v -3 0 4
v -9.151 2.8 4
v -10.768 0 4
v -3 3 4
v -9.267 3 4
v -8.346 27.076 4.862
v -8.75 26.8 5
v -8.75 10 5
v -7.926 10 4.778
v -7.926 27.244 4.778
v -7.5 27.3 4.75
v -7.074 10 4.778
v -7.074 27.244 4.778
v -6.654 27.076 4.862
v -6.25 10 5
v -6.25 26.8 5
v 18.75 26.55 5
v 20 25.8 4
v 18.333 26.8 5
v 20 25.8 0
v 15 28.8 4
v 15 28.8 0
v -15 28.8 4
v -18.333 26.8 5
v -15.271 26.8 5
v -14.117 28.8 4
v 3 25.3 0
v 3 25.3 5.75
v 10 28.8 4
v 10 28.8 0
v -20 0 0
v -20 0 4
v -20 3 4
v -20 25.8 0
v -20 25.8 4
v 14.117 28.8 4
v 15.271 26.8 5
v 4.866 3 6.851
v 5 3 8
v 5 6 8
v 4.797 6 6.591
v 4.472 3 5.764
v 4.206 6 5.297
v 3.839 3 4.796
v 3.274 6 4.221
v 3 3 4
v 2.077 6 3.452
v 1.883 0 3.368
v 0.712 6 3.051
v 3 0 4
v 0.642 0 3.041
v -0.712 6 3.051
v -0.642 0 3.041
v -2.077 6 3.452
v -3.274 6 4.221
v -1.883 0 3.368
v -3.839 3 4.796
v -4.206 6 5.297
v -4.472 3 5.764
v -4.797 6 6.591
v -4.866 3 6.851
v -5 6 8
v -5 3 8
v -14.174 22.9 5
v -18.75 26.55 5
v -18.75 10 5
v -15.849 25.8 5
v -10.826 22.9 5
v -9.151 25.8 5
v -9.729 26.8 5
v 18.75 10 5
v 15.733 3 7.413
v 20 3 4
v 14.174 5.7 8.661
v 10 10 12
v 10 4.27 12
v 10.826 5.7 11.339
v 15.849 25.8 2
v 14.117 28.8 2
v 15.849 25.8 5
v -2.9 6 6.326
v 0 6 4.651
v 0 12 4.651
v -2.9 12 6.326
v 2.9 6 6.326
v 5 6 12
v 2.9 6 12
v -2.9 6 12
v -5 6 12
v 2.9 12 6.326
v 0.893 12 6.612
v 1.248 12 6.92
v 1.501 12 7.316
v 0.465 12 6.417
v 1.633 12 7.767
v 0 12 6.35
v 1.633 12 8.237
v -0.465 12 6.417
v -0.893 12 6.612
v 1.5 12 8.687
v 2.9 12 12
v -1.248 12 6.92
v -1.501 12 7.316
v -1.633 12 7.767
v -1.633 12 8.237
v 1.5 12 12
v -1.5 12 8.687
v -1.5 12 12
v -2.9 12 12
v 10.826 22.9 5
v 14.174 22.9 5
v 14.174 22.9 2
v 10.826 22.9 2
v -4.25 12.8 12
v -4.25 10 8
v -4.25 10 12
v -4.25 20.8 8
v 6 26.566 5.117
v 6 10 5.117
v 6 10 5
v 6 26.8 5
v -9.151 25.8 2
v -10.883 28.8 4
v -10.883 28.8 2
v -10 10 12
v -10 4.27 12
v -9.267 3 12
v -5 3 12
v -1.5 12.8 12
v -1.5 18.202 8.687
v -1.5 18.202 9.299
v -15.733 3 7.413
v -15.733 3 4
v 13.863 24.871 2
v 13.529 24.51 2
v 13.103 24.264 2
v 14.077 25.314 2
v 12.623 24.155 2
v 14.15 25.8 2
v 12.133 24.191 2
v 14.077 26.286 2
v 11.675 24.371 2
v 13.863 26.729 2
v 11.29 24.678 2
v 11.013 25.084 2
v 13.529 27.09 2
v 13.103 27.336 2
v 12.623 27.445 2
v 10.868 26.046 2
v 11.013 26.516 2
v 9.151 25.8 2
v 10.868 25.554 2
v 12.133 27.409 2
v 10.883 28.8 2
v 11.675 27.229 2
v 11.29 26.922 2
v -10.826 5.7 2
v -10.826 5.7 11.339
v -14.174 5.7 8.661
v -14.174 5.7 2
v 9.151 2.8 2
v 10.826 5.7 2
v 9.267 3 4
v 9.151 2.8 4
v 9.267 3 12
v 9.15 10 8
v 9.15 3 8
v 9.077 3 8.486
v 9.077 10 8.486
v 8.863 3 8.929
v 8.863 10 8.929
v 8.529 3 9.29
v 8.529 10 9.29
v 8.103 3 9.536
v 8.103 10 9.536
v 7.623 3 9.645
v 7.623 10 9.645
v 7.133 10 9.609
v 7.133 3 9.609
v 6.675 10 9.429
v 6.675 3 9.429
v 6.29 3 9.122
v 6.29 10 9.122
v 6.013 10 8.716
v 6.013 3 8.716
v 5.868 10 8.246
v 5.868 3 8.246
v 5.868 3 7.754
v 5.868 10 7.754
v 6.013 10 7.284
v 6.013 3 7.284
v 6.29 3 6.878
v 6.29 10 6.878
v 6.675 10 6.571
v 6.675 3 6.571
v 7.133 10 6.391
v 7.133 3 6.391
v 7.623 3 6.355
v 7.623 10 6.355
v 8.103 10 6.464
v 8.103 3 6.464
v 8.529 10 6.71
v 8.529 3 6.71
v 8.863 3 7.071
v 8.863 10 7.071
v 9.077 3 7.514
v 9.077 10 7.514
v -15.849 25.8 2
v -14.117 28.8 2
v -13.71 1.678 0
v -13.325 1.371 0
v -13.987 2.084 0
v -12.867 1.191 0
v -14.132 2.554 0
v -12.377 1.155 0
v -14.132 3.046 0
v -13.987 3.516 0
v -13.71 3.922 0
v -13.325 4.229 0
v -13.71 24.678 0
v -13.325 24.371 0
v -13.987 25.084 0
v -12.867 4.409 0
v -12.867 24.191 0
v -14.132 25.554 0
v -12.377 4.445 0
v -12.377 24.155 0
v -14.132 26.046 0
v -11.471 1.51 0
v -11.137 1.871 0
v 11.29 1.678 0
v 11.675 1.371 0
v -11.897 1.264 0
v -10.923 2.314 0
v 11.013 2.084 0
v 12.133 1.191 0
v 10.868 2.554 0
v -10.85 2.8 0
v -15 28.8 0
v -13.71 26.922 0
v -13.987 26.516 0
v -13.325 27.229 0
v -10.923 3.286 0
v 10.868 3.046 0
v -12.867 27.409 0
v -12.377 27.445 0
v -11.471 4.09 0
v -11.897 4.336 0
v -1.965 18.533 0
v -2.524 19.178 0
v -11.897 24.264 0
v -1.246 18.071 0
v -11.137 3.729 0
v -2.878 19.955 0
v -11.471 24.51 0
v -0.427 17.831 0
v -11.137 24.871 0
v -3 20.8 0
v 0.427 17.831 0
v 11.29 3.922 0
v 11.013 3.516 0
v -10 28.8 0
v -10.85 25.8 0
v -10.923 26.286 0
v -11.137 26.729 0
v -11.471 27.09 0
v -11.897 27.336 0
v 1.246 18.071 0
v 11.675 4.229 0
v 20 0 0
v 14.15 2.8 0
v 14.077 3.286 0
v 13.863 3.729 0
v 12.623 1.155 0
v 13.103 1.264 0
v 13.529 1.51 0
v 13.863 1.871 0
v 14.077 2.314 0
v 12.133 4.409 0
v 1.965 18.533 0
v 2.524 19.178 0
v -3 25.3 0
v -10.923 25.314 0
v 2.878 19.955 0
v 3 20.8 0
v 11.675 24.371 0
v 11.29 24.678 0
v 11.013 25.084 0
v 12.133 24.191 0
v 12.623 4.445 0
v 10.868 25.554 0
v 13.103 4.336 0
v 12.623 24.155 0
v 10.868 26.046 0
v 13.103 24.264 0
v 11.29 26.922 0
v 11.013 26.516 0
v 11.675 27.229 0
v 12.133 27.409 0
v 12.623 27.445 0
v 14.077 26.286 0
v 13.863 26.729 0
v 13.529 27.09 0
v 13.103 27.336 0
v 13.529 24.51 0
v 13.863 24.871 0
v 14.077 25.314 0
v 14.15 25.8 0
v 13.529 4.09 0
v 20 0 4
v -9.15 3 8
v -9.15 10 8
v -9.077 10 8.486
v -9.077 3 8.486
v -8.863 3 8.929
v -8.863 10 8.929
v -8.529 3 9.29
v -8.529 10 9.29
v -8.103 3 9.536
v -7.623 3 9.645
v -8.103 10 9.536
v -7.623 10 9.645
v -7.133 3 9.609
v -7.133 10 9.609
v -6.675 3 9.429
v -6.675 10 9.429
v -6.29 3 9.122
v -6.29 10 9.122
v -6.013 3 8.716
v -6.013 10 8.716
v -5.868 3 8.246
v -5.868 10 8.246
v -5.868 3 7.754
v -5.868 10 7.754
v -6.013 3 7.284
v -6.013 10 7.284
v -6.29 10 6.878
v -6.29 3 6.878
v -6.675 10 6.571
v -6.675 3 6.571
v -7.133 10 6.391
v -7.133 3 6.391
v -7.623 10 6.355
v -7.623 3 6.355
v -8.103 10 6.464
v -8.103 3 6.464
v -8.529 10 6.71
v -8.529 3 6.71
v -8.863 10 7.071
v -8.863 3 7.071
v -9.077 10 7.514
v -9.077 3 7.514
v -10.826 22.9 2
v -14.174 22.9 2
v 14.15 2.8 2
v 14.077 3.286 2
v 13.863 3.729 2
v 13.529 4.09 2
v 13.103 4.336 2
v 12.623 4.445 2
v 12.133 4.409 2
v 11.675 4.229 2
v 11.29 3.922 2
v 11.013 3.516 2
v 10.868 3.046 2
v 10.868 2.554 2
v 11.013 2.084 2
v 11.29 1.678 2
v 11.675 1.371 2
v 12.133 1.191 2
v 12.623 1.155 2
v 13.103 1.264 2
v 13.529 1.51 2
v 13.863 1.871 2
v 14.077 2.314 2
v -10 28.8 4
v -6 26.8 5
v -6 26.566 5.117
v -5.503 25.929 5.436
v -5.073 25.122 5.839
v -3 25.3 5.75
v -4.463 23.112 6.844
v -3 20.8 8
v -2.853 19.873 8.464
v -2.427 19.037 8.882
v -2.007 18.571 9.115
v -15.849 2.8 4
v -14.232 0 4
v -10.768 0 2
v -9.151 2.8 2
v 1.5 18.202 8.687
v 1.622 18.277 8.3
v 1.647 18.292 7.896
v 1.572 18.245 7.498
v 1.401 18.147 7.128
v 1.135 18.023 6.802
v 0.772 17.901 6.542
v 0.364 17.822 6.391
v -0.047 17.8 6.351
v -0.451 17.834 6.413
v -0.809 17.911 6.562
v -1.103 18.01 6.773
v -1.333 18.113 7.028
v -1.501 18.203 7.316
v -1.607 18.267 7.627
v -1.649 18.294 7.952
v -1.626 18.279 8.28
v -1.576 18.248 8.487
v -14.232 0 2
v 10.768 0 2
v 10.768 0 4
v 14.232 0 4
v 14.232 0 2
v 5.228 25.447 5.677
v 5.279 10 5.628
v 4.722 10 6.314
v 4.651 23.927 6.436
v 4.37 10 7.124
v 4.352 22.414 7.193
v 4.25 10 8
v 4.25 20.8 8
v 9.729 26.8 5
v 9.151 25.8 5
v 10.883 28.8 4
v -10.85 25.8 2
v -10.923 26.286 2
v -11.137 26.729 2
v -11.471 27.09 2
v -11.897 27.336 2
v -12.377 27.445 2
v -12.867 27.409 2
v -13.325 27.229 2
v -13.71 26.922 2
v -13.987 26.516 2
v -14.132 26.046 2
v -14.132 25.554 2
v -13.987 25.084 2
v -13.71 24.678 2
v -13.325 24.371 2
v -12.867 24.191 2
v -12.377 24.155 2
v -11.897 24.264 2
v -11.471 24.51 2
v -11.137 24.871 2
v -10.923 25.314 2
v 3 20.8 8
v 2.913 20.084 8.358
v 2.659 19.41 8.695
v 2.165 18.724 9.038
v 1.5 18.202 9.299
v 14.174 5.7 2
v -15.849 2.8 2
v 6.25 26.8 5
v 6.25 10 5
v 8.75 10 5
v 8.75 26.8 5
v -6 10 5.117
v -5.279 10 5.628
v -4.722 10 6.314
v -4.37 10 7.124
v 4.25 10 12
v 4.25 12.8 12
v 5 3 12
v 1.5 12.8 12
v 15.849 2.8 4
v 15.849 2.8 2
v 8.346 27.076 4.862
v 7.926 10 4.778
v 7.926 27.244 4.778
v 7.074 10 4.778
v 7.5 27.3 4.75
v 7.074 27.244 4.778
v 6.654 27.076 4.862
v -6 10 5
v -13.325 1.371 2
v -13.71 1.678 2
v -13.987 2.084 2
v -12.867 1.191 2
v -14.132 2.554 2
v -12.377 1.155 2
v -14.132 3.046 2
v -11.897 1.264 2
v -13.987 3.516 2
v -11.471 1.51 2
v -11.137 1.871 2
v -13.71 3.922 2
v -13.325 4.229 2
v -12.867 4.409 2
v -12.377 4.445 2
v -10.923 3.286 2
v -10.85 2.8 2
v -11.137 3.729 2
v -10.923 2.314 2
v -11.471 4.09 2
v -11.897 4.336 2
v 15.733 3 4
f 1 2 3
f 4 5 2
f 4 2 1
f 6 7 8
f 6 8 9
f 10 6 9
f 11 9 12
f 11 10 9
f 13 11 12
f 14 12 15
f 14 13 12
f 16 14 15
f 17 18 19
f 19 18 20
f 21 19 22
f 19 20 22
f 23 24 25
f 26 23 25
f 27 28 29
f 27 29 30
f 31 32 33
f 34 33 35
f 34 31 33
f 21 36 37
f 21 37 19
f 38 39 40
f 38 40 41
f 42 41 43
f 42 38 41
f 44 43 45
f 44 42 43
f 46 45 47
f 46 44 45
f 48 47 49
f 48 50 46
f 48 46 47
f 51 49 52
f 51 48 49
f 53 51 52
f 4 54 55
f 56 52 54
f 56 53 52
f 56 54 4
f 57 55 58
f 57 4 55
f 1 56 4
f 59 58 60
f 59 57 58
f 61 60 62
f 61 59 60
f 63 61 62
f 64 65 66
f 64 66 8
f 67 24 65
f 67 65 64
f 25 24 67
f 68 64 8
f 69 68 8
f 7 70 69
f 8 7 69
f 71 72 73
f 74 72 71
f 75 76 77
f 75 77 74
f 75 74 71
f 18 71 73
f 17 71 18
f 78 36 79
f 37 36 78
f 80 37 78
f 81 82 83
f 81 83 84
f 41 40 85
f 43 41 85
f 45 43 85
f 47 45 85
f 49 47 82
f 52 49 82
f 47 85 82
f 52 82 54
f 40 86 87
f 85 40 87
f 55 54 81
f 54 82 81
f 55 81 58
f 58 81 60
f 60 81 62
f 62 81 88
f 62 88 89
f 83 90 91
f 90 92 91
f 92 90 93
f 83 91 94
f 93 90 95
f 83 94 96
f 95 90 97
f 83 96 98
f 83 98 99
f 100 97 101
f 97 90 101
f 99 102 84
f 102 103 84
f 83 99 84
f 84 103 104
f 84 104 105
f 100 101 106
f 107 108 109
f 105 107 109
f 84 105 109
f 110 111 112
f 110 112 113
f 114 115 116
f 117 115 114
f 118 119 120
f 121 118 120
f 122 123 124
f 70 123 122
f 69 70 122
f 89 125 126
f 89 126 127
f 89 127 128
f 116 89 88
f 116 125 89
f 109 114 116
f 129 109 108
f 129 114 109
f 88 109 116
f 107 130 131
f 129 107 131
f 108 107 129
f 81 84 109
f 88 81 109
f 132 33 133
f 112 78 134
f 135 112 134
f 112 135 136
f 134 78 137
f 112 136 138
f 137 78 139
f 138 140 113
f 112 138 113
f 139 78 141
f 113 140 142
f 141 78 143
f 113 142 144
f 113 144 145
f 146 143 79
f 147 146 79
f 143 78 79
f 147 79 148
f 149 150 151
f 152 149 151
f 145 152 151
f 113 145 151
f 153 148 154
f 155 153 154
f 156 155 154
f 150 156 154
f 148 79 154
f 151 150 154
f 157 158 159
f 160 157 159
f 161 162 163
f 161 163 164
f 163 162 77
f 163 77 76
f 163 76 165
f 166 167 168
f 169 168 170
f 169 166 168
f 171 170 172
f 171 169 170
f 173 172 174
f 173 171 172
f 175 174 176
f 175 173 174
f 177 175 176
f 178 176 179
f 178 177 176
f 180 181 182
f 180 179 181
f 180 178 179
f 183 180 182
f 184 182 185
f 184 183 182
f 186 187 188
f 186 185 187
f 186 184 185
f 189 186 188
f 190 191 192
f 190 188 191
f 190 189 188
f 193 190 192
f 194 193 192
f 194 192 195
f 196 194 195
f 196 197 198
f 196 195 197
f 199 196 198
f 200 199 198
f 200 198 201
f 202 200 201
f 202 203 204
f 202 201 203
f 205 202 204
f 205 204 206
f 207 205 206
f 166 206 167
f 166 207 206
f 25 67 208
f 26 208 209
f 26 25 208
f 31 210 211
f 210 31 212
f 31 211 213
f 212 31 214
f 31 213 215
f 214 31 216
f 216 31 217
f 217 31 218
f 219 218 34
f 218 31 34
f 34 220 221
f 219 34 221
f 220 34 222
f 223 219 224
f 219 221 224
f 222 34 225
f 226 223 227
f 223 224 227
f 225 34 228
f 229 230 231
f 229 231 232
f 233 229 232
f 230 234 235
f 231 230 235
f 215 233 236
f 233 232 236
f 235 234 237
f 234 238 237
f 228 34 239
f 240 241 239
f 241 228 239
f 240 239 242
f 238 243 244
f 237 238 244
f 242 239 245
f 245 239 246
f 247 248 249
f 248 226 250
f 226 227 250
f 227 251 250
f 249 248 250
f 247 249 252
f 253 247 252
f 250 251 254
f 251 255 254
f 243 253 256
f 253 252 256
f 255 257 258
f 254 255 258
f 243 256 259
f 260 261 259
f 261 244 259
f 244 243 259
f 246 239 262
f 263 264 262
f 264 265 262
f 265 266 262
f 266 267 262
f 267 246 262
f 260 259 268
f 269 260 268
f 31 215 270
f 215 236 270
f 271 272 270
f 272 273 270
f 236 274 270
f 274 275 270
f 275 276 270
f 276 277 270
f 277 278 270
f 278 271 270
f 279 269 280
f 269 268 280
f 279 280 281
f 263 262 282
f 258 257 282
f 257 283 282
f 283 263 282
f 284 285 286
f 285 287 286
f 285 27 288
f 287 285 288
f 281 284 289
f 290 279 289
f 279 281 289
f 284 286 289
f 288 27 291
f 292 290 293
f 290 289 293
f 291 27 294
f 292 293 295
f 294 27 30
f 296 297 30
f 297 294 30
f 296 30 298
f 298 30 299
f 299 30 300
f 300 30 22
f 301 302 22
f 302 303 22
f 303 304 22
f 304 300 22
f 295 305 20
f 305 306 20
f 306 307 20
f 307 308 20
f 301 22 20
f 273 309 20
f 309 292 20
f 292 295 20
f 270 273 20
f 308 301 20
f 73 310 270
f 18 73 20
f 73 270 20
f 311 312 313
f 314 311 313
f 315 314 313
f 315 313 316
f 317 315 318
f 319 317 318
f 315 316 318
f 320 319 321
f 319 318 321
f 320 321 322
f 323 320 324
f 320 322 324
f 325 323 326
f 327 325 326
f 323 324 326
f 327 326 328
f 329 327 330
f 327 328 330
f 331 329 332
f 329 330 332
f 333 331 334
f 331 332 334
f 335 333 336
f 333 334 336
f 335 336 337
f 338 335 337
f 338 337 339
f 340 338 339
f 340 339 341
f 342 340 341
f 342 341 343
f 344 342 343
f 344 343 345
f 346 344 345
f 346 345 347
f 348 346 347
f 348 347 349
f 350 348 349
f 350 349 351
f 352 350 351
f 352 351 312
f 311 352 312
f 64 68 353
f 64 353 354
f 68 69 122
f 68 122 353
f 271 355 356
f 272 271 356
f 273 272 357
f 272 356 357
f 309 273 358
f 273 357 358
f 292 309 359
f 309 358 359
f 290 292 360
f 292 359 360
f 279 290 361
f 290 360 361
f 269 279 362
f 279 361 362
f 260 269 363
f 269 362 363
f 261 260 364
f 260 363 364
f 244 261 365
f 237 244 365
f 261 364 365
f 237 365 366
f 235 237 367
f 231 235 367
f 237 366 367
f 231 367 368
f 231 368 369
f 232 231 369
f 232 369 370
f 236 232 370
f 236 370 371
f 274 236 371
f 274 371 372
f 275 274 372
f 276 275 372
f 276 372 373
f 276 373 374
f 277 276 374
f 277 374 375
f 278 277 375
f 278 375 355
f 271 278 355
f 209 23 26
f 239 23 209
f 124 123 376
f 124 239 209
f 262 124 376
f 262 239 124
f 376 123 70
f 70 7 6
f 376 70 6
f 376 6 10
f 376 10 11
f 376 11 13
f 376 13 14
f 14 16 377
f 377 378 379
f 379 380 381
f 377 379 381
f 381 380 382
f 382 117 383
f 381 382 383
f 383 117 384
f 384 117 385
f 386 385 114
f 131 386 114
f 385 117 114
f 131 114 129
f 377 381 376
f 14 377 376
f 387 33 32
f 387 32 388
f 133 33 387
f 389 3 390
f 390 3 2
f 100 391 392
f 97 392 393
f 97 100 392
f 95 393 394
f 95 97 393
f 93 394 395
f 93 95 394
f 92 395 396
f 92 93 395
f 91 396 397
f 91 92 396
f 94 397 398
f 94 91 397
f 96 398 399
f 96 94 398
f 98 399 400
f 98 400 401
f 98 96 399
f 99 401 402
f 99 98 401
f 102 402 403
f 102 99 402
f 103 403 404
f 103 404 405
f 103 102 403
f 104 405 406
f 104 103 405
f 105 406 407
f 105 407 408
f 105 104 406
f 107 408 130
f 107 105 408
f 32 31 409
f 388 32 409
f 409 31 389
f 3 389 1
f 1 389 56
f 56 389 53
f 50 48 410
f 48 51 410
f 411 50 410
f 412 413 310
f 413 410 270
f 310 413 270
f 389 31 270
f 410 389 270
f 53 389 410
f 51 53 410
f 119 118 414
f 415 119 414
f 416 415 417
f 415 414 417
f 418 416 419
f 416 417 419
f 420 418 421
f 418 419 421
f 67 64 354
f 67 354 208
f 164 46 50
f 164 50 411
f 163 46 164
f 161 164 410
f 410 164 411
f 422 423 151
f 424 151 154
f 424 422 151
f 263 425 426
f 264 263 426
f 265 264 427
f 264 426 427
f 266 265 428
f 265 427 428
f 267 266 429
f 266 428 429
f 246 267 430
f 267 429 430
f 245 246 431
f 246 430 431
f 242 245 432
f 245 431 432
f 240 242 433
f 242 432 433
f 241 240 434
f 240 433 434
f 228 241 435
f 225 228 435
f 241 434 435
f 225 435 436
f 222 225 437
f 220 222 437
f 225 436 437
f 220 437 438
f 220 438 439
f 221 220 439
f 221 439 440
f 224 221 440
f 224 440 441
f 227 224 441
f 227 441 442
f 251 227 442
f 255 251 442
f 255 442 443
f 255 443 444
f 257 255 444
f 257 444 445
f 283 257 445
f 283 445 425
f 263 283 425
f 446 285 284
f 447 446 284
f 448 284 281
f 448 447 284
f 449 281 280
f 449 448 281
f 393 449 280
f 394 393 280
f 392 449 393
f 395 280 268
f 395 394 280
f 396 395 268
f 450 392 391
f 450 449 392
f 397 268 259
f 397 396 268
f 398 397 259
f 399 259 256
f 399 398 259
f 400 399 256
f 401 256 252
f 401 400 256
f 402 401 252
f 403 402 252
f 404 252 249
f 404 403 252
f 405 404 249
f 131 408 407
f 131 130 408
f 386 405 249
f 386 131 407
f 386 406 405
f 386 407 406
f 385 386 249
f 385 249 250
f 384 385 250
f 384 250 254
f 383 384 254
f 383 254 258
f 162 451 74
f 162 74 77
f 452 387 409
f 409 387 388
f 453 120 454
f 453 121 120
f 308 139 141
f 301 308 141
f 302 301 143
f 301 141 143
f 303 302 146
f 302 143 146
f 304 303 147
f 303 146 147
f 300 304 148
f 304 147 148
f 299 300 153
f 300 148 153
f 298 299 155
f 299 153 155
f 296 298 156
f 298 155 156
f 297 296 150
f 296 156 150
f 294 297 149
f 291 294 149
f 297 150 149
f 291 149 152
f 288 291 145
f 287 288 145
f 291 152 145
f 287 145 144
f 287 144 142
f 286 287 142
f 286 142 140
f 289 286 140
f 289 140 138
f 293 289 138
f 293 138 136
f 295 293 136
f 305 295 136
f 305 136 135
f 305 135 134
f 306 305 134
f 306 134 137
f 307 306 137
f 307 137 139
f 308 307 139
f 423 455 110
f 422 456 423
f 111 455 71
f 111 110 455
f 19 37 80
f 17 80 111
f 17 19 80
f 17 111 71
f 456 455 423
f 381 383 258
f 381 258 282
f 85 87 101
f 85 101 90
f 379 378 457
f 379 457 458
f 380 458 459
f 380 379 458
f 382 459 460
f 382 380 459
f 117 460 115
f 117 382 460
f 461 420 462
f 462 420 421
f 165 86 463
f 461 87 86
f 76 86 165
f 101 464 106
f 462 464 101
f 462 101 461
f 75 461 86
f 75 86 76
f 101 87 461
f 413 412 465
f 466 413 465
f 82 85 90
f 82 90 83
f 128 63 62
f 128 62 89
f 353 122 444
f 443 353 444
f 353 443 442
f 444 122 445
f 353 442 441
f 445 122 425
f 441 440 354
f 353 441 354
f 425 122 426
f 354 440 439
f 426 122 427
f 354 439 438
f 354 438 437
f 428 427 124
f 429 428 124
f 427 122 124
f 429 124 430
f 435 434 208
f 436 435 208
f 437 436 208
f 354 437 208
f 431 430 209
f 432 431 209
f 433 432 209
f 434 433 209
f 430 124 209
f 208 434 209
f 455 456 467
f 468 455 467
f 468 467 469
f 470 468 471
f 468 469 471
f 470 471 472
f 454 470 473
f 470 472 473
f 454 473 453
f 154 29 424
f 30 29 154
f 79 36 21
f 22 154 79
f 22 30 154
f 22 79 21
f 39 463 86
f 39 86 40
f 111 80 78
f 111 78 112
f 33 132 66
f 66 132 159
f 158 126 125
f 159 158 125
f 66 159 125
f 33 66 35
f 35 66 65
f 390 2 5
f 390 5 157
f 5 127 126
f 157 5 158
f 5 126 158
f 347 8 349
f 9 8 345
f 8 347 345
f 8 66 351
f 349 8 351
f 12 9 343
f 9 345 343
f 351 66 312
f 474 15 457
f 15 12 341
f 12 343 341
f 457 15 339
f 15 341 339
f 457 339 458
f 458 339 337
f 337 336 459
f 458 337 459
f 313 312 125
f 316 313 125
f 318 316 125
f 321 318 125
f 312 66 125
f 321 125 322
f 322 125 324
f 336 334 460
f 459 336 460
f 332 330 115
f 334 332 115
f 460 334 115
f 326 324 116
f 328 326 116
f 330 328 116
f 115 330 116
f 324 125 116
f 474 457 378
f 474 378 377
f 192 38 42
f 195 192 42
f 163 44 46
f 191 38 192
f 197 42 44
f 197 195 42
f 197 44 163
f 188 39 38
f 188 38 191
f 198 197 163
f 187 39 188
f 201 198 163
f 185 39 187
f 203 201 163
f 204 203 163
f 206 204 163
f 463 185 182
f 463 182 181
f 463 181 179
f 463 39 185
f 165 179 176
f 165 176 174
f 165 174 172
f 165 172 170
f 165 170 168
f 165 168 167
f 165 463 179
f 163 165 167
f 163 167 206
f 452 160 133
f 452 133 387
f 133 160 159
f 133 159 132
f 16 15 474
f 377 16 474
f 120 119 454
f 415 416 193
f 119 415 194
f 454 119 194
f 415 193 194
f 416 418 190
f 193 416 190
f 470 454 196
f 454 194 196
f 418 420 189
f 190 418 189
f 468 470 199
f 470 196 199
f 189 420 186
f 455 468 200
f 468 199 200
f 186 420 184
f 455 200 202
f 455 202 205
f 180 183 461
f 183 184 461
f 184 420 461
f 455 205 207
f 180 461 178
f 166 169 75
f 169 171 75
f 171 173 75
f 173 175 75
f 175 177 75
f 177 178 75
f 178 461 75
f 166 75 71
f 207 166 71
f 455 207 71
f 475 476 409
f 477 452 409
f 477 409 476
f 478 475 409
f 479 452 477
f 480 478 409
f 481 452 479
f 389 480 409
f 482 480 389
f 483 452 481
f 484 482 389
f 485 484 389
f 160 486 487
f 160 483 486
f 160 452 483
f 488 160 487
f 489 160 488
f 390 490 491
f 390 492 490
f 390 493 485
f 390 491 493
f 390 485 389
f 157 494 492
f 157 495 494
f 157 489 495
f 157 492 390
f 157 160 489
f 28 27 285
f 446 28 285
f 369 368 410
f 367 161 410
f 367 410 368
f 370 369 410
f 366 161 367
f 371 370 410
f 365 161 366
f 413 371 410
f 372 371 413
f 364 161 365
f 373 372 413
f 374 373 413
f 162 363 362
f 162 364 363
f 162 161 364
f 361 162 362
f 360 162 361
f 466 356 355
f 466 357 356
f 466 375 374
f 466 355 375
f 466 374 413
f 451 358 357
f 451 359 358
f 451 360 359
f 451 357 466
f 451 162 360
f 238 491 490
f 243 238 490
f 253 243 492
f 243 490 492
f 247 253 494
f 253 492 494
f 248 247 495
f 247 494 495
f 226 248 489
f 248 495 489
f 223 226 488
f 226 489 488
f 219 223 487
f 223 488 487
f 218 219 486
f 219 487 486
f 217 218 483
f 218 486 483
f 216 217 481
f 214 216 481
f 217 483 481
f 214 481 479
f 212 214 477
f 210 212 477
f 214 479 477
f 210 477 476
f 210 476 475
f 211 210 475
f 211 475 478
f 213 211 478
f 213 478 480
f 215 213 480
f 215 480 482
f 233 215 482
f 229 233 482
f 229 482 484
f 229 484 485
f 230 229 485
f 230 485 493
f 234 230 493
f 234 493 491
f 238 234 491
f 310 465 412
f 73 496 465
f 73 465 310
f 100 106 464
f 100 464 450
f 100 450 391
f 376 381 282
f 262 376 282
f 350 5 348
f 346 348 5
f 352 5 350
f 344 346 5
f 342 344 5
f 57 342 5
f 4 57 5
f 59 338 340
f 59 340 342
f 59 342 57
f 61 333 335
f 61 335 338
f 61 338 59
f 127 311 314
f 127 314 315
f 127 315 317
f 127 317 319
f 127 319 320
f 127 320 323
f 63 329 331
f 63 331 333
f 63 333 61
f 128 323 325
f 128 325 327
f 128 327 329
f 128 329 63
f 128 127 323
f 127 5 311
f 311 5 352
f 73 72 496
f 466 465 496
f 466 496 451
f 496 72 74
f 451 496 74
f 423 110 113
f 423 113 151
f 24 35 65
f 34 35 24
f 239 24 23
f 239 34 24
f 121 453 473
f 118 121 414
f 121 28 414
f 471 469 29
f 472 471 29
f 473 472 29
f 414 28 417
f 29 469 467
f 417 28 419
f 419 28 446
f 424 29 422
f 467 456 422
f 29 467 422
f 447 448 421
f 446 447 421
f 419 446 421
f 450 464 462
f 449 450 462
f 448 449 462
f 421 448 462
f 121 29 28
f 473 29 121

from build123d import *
from OCP.BRepFilletAPI import BRepFilletAPI_MakeChamfer

# Parameters (mm, degrees)
SKETCH1_W           = 40
SKETCH1_H           = 28.8
BOSS_EXTRUDE1_DEPTH = 12
CHAMFER2_SIZE       = 8
CHAMFER2_SIZE2      = 16
SKETCH10_W          = 14
SKETCH10_H          = 18.8
CUT_EXTRUDE7_DEPTH  = 7
SKETCH11_W          = 40
SKETCH11_H          = 3
CUT_EXTRUDE8_DEPTH  = 8
CHAMFER3_SIZE       = 8
CHAMFER3_SIZE2      = 10
CUT_EXTRUDE9_REACH  = 39.06
SKETCH13_R          = 1.65
CUT_EXTRUDE10_DEPTH = 30.957302949
CUT_EXTRUDE2_DEPTH  = 6
CUT_EXTRUDE3_DEPTH  = 38.05995143
SKETCH2_R           = 1.65
CUT_EXTRUDE1_DEPTH  = 38.05995143
CUT_EXTRUDE4_DEPTH  = 10
CUT_EXTRUDE5_DEPTH  = 6
CUT_EXTRUDE6_DEPTH  = 29.744390757
CHAMFER4_SIZE       = 3
CHAMFER4_SIZE_2     = 5
CHAMFER5_SIZE       = 3
CHAMFER5_SIZE_2     = 5
CHAMFER6_SIZE2      = 7
CHAMFER6_SIZE       = 3.5
CHAMFER7_SIZE2      = 7
CHAMFER7_SIZE       = 3.5


# Some blends are built 0.0001 mm under size
with BuildPart() as part:
    # Sketch1 → Boss-Extrude1 (new body)
    with BuildSketch(Plane.XY):
        with Locations((0, 14.4)):
            Rectangle(SKETCH1_W, SKETCH1_H)
    extrude(amount=BOSS_EXTRUDE1_DEPTH)

    # Chamfer2
    chamfer2_edges = [part.edges().sort_by_distance(p)[0] for p in [
        (0, 28.8, 12),
    ]]
    chamfer2_side = [part.faces().sort_by_distance(p)[0] for p in [
        (0, 28.8, 6),
    ]]
    chamfer(chamfer2_edges, length=CHAMFER2_SIZE, length2=CHAMFER2_SIZE2, reference=chamfer2_side[0])

    # Sketch10 → Cut-Extrude7 (cut)
    with BuildSketch(Plane.XY.offset(12)):
        with Locations((-13, 19.4)):
            Rectangle(SKETCH10_W, SKETCH10_H)
        with Locations((13, 19.4)):
            Rectangle(SKETCH10_W, SKETCH10_H)
    extrude(amount=-CUT_EXTRUDE7_DEPTH, mode=Mode.SUBTRACT)

    # Sketch11 → Cut-Extrude8 (cut)
    with BuildSketch(Plane.XY.offset(12)):
        with Locations((0, 1.5)):
            Rectangle(SKETCH11_W, SKETCH11_H)
    extrude(amount=-CUT_EXTRUDE8_DEPTH, mode=Mode.SUBTRACT)

    # Chamfer3: one chamfer whose edges measure the first distance from different faces: ONE call of the kernel's chamfer builder (chamfer() names one face for all edges)
    chamfer3_edges_1 = [part.edges().sort_by_distance(p)[0] for p in [
        (-20, 6.5, 12),
    ]]
    chamfer3_side_1 = [part.faces().sort_by_distance(p)[0] for p in [
        (-20, 12.483950617, 4.012345679),
    ]]
    chamfer3_edges_2 = [part.edges().sort_by_distance(p)[0] for p in [
        (20, 6.5, 12),
    ]]
    chamfer3_side_2 = [part.faces().sort_by_distance(p)[0] for p in [
        (20, 12.483950617, 4.012345679),
    ]]
    chamfer3 = BRepFilletAPI_MakeChamfer(part.part.solid().wrapped)
    for e in chamfer3_edges_1:
        chamfer3.Add(CHAMFER3_SIZE, CHAMFER3_SIZE2, e.wrapped, chamfer3_side_1[0].wrapped)  # the first distance lies on this face
    for e in chamfer3_edges_2:
        chamfer3.Add(CHAMFER3_SIZE, CHAMFER3_SIZE2, e.wrapped, chamfer3_side_2[0].wrapped)  # the first distance lies on this face
    add(Compound.cast(chamfer3.Shape()), mode=Mode.REPLACE)

    # Cut-Extrude9: up to this face of the body (flat: up to its plane)
    cut_extrude9_end = Plane(part.part.faces().sort_by_distance((-10.56840796, 10, 7.890547264))[0])
    # Sketch12 → Cut-Extrude9 (cut, up to the picked face)
    with BuildSketch(Plane(origin=(0, 28.8, 0), x_dir=(1, 0, 0), z_dir=(0, 1, 0)), mode=Mode.PRIVATE) as cut_extrude9_sk1:
        with BuildLine():
            Line((-4.25, -8), (-4.25, -12))
            Line((-4.25, -12), (-10.75, -12))
            Line((-10.75, -12), (-10.75, -8))
            ThreePointArc((-10.75, -8), (-7.5, -4.75), (-4.25, -8))
        make_face()
    cut_extrude9_tool1 = split(extrude(cut_extrude9_sk1.sketch, amount=-CUT_EXTRUDE9_REACH, mode=Mode.PRIVATE), bisect_by=cut_extrude9_end, keep=Keep.BOTH, mode=Mode.PRIVATE)
    cut_extrude9 = cut_extrude9_tool1.solids().sort_by(Axis((-7.5, 28.8, 8.683577), (0, -1, 0)))[0]
    add(cut_extrude9, mode=Mode.SUBTRACT)

    # Sketch13 → Cut-Extrude10 (cut, through all)
    with BuildSketch(Plane(origin=(0, 10, 0), x_dir=(1, 0, 0), z_dir=(0, 1, 0))):
        with Locations(Location((-7.5, -8, 0), (0, 0, 180))):
            Circle(SKETCH13_R)
    cut_extrude10 = extrude(amount=-CUT_EXTRUDE10_DEPTH, mode=Mode.SUBTRACT)

    # Sketch3 → Cut-Extrude2 (cut)
    with BuildSketch(Plane.XZ):
        with BuildLine():
            Line((-5, 8), (-5, 12))
            Line((-5, 12), (5, 12))
            Line((5, 12), (5, 8))
            ThreePointArc((5, 8), (0, 3), (-5, 8))
        make_face()
    extrude(amount=-CUT_EXTRUDE2_DEPTH, mode=Mode.SUBTRACT)

    # Sketch4 → Cut-Extrude3 (cut, through all)
    with BuildSketch(Plane.XY.offset(12)):
        with BuildLine():
            Line((-3, 20.8), (-3, 28.8))
            Line((-3, 28.8), (3, 28.8))
            Line((3, 28.8), (3, 20.8))
            ThreePointArc((3, 20.8), (0, 17.8), (-3, 20.8))
        make_face()
    extrude(amount=-CUT_EXTRUDE3_DEPTH, mode=Mode.SUBTRACT)

    # Sketch2 → Cut-Extrude1 (cut, through all)
    with BuildSketch(Plane.XY.offset(12)):
        with Locations((-12.5, 2.8)):
            Circle(SKETCH2_R)
        with Locations((12.5, 2.8)):
            Circle(SKETCH2_R)
        with Locations((12.5, 25.8)):
            Circle(SKETCH2_R)
        with Locations((-12.5, 25.8)):
            Circle(SKETCH2_R)
    extrude(amount=-CUT_EXTRUDE1_DEPTH, mode=Mode.SUBTRACT)

    # Sketch5 → Cut-Extrude4 (cut)
    with BuildSketch(Plane.XY.offset(12)):
        Polygon((-13.803959833, 29.341475319), (-11.196040167, 29.341475319), (-9.151368439, 25.8), (-10.825684219, 22.9), (-14.174315781, 22.9), (-15.848631561, 25.8), align=None)
        Polygon((11.196040167, 29.341475319), (13.803959833, 29.341475319), (15.848631561, 25.8), (14.174315781, 22.9), (10.825684219, 22.9), (9.151368439, 25.8), align=None)
        Polygon((-9.151368439, 2.8), (-10.825684219, 5.7), (-14.174315781, 5.7), (-15.848631561, 2.8), (-14.174315781, -0.1), (-10.825684219, -0.1), align=None)
        Polygon((15.848631561, 2.8), (14.174315781, 5.7), (10.825684219, 5.7), (9.151368439, 2.8), (10.825684219, -0.1), (14.174315781, -0.1), align=None)
    extrude(amount=-CUT_EXTRUDE4_DEPTH, mode=Mode.SUBTRACT)

    # Sketch6 → Cut-Extrude5 (cut)
    with BuildSketch(Plane.XZ.offset(-6)):
        Polygon((-2.9, 12), (2.9, 12), (2.9, 6.325684219), (0, 4.651368439), (-2.9, 6.325684219), align=None)
    extrude(amount=-CUT_EXTRUDE5_DEPTH, mode=Mode.SUBTRACT)

    # Sketch7 → Cut-Extrude6 (cut, through all)
    with BuildSketch(Plane.XZ.offset(-12)):
        with BuildLine():
            Line((-1.5, 8.687386354), (-1.5, 12))
            Line((-1.5, 12), (1.5, 12))
            Line((1.5, 12), (1.5, 8.687386354))
            ThreePointArc((1.5, 8.687386354), (0, 6.35), (-1.5, 8.687386354))
        make_face()
    extrude(amount=-CUT_EXTRUDE6_DEPTH, mode=Mode.SUBTRACT)

    # Mirror1: Cut-Extrude9, Cut-Extrude10 across plane
    add(cut_extrude9.mirror(Plane(origin=(0, 0, 0), x_dir=(0, 0, 1), z_dir=(1, 0, 0))), mode=Mode.SUBTRACT)
    add(cut_extrude10.mirror(Plane(origin=(0, 0, 0), x_dir=(0, 0, 1), z_dir=(1, 0, 0))), mode=Mode.SUBTRACT)

    # Chamfer4
    # the kernel refuses this chamfer: 5, 3 mm, written as the material it takes off along each edge
    with BuildSketch(Plane(origin=(20, 28.8, -12.931305486), x_dir=(0.05518620705976579, -0.9984760801092616, 0), z_dir=(0, 0, 1))) as chamfer4_piece_1:
        Polygon((CHAMFER4_SIZE * 0.998476080109, -CHAMFER4_SIZE * 0.0551862070598), (-CHAMFER4_SIZE_2 * 0.0551862070598, -CHAMFER4_SIZE_2 * 0.998476080109), (0, 0), align=None)
    extrude(amount=29.862610972, mode=Mode.SUBTRACT)

    # Chamfer5
    # the kernel refuses this chamfer: 5, 3 mm, written as the material it takes off along each edge
    with BuildSketch(Plane(origin=(-20, 28.8, -12.931305486), x_dir=(-0.05518620705976579, -0.9984760801092616, 0), z_dir=(0, 0, 1))) as chamfer5_piece_1:
        Polygon((CHAMFER5_SIZE * 0.998476080109, CHAMFER5_SIZE * 0.0551862070598), (-CHAMFER5_SIZE_2 * 0.0551862070598, CHAMFER5_SIZE_2 * 0.998476080109), (0, 0), align=None)
    extrude(amount=29.862610972, mode=Mode.SUBTRACT)

    # Chamfer6
    chamfer6_edges = [part.edges().sort_by_distance(p)[0] for p in [
        (-3, 28.8, 2),
    ]]
    chamfer6_side = [part.faces().sort_by_distance(p)[0] for p in [
        (-3, 28.73, 2),
    ]]
    chamfer(chamfer6_edges, length=CHAMFER6_SIZE - 0.0001, length2=CHAMFER6_SIZE2 - 0.0001, reference=chamfer6_side[0])  # a hair under: the kernel refuses the full size

    # Chamfer7
    chamfer7_edges = [part.edges().sort_by_distance(p)[0] for p in [
        (3, 28.8, 2),
    ]]
    chamfer7_side = [part.faces().sort_by_distance(p)[0] for p in [
        (3, 28.73, 2),
    ]]
    chamfer(chamfer7_edges, length=CHAMFER7_SIZE - 0.0001, length2=CHAMFER7_SIZE2 - 0.0001, reference=chamfer7_side[0])  # a hair under: the kernel refuses the full size


solid = part.part
